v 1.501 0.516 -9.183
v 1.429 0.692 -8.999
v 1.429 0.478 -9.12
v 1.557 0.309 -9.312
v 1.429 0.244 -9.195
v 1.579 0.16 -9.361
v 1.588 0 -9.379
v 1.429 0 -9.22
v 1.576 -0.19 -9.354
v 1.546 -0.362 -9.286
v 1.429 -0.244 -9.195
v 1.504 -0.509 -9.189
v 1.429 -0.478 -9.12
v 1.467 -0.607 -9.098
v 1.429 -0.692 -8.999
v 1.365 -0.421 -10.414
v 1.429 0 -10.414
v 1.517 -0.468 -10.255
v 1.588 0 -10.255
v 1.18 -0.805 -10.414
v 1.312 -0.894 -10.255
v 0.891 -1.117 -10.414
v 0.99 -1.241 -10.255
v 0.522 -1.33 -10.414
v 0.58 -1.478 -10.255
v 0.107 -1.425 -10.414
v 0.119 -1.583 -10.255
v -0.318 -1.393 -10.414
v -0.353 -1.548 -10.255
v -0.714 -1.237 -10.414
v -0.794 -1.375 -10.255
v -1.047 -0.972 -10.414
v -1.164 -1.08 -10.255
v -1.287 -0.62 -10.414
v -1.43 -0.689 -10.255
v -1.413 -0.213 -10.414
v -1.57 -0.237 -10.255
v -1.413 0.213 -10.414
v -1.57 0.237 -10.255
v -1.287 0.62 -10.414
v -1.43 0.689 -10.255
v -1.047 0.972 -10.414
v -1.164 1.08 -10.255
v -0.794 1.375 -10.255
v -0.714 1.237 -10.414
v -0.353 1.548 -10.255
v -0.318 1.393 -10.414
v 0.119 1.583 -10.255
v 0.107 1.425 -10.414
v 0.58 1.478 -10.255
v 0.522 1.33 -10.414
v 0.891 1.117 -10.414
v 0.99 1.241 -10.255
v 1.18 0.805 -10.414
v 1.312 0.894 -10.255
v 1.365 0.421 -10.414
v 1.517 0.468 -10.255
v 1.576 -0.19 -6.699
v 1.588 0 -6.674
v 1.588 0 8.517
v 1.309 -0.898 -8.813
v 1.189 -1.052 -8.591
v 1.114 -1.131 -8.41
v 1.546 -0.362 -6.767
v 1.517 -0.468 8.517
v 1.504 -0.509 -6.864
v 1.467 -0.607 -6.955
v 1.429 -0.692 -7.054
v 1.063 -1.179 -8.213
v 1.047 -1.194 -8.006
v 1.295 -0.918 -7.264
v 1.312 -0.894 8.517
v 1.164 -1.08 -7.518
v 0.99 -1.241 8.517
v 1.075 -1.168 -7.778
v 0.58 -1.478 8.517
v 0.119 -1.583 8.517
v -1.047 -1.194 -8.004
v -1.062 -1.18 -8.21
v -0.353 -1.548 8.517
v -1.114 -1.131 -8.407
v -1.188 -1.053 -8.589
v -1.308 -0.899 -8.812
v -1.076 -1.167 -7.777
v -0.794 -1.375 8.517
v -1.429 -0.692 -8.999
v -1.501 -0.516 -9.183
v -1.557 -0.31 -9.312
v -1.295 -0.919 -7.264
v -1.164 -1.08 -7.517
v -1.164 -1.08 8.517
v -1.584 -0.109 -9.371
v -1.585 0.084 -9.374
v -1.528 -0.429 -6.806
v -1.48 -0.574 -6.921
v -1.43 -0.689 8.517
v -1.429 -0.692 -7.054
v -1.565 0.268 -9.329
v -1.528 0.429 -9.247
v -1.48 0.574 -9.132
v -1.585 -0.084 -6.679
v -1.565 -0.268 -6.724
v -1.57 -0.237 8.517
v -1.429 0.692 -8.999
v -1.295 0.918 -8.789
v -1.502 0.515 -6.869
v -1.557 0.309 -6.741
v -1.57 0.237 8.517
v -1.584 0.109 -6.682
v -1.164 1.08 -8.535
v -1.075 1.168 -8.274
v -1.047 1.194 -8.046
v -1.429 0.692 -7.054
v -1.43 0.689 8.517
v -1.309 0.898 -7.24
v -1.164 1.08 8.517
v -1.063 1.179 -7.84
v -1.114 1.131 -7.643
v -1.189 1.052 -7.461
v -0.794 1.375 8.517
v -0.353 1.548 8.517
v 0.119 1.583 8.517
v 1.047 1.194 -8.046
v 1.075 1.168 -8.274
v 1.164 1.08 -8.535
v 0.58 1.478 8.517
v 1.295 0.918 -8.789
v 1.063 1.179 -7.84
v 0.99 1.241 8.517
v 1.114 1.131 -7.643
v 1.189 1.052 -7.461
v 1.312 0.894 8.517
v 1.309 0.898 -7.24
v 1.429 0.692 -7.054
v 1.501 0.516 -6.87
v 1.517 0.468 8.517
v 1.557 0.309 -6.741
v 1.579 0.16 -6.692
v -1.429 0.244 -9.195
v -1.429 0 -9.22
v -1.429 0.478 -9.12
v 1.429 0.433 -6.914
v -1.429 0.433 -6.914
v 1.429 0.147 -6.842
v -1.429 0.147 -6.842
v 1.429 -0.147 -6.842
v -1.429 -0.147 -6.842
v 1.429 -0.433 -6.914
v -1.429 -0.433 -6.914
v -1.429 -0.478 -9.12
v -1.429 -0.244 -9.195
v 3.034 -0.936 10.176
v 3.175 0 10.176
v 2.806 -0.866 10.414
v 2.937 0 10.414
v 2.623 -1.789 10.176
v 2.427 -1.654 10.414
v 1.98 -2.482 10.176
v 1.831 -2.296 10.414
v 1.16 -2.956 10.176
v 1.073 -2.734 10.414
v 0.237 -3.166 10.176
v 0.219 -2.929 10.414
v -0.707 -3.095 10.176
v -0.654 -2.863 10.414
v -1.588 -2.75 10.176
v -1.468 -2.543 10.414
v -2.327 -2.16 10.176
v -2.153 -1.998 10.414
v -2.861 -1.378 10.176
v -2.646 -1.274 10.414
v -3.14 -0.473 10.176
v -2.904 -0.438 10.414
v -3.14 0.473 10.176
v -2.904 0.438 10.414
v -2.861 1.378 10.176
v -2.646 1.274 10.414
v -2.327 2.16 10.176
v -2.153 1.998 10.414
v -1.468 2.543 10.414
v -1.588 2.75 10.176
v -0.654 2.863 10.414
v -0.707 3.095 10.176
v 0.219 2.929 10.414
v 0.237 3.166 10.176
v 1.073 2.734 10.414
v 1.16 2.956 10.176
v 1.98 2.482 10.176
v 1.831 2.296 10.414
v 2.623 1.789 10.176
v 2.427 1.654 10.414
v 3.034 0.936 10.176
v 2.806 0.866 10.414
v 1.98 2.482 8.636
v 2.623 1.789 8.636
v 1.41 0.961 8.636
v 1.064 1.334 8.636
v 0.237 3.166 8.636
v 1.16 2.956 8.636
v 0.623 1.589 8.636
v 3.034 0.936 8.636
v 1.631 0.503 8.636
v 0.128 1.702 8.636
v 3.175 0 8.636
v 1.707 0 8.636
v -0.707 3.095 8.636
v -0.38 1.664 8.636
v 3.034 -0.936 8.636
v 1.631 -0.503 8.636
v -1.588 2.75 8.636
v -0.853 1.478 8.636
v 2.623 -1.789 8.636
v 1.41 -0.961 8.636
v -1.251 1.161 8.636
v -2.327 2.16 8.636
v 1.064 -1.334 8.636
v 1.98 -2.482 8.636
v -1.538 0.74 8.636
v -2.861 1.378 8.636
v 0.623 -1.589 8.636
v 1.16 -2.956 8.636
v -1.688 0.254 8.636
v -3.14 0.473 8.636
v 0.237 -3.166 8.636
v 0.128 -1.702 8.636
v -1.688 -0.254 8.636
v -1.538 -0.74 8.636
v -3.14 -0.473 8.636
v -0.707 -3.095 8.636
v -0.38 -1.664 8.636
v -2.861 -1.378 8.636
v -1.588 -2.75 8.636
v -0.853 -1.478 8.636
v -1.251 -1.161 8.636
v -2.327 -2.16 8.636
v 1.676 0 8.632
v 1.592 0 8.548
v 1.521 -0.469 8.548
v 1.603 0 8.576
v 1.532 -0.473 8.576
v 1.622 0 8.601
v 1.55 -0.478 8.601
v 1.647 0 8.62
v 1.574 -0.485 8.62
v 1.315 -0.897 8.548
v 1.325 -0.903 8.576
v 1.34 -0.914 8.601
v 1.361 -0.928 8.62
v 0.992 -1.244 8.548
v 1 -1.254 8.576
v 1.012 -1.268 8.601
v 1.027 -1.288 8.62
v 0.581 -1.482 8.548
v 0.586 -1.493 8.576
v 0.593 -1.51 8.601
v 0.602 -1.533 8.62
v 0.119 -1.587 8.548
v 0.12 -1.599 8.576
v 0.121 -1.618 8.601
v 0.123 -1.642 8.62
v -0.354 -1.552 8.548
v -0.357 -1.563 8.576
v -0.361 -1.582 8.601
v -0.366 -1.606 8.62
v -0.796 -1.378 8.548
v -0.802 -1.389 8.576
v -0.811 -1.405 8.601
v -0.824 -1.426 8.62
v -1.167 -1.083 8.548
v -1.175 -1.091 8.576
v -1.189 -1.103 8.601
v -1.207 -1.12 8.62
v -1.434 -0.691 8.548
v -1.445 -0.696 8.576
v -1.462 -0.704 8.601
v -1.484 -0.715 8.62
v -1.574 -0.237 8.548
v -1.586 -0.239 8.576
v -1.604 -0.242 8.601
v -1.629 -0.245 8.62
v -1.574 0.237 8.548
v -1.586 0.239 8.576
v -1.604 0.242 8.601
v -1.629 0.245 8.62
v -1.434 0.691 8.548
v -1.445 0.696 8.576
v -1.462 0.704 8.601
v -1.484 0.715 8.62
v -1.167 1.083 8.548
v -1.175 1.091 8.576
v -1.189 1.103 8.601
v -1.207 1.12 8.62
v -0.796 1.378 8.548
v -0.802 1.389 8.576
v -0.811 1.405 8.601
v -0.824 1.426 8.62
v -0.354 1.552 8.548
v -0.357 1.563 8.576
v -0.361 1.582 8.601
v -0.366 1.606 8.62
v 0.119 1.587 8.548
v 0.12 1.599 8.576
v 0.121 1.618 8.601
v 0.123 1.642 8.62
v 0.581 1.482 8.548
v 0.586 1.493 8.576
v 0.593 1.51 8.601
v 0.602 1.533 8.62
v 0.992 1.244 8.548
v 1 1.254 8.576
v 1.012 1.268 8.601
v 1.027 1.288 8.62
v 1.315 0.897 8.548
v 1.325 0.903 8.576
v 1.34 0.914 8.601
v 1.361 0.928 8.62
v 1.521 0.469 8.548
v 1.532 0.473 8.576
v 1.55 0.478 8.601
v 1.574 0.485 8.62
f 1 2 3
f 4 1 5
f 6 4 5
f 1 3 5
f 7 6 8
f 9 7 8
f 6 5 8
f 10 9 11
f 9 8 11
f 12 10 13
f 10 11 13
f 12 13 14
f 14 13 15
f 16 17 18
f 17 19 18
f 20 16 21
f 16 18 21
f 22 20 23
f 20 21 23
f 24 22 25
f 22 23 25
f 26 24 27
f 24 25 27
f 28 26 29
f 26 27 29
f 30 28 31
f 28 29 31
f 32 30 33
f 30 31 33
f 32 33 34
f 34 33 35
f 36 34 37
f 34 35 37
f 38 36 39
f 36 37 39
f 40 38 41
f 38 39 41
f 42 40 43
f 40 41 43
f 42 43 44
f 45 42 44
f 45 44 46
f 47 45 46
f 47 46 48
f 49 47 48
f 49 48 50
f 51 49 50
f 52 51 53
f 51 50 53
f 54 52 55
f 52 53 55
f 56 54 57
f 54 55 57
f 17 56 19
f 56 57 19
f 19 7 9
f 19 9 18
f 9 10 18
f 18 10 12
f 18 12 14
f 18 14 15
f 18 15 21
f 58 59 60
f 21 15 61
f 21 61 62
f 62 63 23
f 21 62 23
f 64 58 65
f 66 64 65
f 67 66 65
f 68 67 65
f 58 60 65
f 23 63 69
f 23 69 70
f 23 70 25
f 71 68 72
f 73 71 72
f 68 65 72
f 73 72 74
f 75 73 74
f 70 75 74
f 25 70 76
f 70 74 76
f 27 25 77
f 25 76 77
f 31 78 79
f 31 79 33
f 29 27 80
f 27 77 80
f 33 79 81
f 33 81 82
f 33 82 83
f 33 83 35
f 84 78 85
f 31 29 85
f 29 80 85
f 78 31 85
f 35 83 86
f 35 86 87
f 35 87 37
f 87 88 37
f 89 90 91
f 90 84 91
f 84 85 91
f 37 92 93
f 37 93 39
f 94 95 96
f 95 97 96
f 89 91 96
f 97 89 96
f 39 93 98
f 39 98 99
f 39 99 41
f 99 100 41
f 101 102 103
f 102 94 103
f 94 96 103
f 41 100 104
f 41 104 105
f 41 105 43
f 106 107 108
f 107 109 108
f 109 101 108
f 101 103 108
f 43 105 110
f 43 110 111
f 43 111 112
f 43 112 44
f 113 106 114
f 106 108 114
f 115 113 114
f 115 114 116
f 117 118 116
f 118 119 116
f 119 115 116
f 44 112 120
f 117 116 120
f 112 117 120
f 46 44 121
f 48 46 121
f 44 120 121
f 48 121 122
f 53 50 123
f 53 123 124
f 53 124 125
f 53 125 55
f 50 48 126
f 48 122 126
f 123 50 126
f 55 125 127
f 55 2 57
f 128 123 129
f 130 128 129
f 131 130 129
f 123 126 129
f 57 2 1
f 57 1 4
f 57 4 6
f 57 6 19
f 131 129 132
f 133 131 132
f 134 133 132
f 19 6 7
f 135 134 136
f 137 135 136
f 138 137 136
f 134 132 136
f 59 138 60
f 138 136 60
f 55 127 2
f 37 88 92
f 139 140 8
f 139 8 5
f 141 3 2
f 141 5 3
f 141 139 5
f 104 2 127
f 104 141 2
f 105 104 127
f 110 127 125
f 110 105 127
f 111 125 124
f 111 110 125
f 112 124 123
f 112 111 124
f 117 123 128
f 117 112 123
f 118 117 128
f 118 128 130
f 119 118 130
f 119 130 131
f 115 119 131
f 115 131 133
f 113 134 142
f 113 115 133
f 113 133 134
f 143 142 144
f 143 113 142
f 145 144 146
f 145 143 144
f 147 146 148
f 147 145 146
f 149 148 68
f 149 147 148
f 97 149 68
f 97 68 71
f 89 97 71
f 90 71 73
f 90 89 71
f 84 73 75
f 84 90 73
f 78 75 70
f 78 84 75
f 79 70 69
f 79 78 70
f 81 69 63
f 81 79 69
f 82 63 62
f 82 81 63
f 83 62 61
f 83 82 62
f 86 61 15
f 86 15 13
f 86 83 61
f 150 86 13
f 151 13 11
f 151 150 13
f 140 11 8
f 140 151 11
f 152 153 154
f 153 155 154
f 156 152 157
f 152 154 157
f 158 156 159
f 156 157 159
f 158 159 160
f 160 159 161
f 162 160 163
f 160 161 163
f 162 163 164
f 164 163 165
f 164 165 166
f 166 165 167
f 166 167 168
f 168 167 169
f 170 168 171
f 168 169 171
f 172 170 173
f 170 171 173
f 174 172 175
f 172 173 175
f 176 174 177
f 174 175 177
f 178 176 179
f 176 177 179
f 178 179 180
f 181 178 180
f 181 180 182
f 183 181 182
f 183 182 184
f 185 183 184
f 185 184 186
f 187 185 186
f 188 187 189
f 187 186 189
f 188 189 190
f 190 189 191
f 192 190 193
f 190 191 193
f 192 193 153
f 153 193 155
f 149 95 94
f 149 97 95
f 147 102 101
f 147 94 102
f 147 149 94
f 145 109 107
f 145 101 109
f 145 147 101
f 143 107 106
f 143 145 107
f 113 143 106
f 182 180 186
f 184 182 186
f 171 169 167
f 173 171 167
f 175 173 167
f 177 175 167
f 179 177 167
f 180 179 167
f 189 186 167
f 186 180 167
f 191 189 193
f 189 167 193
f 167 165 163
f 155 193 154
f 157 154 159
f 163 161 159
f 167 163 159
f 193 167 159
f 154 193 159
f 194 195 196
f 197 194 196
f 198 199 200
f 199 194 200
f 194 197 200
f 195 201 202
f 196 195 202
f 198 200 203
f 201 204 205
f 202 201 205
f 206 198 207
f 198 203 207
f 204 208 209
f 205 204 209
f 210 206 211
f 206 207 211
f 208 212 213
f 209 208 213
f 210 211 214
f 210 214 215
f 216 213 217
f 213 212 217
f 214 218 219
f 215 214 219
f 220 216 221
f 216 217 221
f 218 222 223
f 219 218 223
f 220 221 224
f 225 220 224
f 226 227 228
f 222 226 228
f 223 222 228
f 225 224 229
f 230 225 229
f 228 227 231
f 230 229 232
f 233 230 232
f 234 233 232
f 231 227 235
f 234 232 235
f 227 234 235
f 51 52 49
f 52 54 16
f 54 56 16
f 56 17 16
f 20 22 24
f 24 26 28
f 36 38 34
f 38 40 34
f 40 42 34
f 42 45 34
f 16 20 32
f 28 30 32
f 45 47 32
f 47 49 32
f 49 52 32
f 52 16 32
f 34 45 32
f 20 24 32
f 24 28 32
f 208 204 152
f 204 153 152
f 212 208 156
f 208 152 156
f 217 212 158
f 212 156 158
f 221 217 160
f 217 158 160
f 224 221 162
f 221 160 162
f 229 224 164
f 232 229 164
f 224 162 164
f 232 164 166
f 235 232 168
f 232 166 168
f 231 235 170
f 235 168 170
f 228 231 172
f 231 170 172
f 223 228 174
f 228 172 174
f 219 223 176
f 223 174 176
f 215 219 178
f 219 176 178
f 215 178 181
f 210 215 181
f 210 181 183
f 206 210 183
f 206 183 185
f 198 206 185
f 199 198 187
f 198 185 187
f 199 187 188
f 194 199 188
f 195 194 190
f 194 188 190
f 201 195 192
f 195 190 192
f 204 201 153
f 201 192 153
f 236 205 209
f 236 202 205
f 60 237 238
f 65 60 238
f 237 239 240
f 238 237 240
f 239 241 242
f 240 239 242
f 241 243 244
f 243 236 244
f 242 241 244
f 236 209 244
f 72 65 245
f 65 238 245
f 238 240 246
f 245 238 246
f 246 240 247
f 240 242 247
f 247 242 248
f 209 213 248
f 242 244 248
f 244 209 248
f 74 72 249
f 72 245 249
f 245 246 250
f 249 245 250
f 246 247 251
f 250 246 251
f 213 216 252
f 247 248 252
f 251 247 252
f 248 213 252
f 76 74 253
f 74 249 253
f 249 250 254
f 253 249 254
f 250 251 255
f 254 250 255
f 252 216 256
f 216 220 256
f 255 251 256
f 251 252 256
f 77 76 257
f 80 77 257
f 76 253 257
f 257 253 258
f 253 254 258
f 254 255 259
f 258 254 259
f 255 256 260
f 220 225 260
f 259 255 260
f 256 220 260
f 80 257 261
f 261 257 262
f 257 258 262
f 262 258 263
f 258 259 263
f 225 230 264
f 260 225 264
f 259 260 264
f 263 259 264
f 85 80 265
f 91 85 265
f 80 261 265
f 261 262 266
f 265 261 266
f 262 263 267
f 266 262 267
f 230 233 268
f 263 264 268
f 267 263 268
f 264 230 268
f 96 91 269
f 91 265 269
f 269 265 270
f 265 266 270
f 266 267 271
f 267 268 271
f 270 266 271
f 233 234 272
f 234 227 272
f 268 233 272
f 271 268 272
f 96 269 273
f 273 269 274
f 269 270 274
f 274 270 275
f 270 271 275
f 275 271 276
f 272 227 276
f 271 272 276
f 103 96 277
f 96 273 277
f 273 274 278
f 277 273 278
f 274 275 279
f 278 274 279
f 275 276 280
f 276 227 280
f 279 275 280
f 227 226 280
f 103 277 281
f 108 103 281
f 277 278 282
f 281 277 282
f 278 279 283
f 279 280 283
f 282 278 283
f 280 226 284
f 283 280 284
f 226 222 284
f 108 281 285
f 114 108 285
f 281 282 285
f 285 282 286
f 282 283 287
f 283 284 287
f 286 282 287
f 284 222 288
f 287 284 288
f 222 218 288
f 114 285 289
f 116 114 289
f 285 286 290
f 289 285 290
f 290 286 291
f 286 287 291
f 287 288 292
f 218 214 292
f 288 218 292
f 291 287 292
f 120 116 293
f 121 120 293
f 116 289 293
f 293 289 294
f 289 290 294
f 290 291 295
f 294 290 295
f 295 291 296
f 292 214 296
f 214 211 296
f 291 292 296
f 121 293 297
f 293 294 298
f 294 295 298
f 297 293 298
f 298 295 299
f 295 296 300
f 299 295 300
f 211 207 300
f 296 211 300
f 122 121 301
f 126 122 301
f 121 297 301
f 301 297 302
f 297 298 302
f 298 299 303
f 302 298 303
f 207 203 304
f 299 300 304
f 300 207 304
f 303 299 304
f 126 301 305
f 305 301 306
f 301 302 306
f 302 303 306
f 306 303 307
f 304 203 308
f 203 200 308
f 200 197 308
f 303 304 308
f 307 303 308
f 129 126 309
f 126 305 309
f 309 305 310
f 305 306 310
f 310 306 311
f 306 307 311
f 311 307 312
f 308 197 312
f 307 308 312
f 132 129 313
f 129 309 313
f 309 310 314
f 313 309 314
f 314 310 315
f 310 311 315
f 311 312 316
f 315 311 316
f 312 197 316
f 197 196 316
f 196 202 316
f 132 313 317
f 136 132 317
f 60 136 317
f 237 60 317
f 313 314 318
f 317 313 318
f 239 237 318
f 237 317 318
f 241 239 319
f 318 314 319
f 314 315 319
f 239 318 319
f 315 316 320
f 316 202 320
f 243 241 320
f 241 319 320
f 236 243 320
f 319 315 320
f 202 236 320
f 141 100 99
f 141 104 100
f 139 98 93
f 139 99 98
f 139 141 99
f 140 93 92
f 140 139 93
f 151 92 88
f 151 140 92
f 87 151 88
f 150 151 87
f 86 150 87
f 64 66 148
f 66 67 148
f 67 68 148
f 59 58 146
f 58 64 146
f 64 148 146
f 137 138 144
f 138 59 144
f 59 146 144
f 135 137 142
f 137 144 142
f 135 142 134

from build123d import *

# Parameters (mm, degrees)
CUT_EXTRUDE1_DEPTH      = 12.340751562
CUT_EXTRUDE1_DEPTH_BACK = 12.340751562
SKETCH3_R               = 1.1938
FILLET1_R               = 0.1190625


with BuildPart() as part:
    # Sketch2 → Revolve1 (revolve)
    with BuildSketch(Plane(origin=(0, 0, 0), x_dir=(0, 0, -1), z_dir=(1, 0, 0))):
        Polygon((10.25525, 1.5875), (-8.636, 1.5875), (-8.636, 3.175), (-10.175875, 3.175), (-10.414, 2.936875), (-10.414, 0), (10.414, 0), (10.414, 1.42875), align=None)
    revolve(axis=Axis((0, 0, 10.414), (0, 0, -1)))

    # Sketch3 → Cut-Extrude1 (cut, two sides: drawn at the far end of the back side and taken through both)
    with BuildSketch(Plane(origin=(0, 0, 0), x_dir=(0, 0, -1), z_dir=(1, 0, 0)).offset(-CUT_EXTRUDE1_DEPTH_BACK)):
        with Locations((8.0264, 0)):
            Circle(SKETCH3_R)
    extrude(amount=CUT_EXTRUDE1_DEPTH + CUT_EXTRUDE1_DEPTH_BACK, mode=Mode.SUBTRACT)

    # Fillet1
    fillet1_edges = [part.edges().sort_by_distance(p)[0] for p in [
        (0, -1.5875, 8.636),
    ]]
    fillet(fillet1_edges, radius=FILLET1_R)

    # Sketch4 → Cut-Revolve1 (revolve, cut)
    with BuildSketch(Plane(origin=(0, 0, 0), x_dir=(1, 0, 0), z_dir=(0, 1, 0))):
        Polygon((-1.5875, 9.37895), (-1.27, 9.06145), (-1.5875, 9.06145), align=None)
        Polygon((1.5875, 9.06145), (1.5875, 9.37895), (1.27, 9.06145), align=None)
    revolve(axis=Axis((0, 0, -8.0264), (-1, 0, 0)), mode=Mode.SUBTRACT)


solid = part.part
